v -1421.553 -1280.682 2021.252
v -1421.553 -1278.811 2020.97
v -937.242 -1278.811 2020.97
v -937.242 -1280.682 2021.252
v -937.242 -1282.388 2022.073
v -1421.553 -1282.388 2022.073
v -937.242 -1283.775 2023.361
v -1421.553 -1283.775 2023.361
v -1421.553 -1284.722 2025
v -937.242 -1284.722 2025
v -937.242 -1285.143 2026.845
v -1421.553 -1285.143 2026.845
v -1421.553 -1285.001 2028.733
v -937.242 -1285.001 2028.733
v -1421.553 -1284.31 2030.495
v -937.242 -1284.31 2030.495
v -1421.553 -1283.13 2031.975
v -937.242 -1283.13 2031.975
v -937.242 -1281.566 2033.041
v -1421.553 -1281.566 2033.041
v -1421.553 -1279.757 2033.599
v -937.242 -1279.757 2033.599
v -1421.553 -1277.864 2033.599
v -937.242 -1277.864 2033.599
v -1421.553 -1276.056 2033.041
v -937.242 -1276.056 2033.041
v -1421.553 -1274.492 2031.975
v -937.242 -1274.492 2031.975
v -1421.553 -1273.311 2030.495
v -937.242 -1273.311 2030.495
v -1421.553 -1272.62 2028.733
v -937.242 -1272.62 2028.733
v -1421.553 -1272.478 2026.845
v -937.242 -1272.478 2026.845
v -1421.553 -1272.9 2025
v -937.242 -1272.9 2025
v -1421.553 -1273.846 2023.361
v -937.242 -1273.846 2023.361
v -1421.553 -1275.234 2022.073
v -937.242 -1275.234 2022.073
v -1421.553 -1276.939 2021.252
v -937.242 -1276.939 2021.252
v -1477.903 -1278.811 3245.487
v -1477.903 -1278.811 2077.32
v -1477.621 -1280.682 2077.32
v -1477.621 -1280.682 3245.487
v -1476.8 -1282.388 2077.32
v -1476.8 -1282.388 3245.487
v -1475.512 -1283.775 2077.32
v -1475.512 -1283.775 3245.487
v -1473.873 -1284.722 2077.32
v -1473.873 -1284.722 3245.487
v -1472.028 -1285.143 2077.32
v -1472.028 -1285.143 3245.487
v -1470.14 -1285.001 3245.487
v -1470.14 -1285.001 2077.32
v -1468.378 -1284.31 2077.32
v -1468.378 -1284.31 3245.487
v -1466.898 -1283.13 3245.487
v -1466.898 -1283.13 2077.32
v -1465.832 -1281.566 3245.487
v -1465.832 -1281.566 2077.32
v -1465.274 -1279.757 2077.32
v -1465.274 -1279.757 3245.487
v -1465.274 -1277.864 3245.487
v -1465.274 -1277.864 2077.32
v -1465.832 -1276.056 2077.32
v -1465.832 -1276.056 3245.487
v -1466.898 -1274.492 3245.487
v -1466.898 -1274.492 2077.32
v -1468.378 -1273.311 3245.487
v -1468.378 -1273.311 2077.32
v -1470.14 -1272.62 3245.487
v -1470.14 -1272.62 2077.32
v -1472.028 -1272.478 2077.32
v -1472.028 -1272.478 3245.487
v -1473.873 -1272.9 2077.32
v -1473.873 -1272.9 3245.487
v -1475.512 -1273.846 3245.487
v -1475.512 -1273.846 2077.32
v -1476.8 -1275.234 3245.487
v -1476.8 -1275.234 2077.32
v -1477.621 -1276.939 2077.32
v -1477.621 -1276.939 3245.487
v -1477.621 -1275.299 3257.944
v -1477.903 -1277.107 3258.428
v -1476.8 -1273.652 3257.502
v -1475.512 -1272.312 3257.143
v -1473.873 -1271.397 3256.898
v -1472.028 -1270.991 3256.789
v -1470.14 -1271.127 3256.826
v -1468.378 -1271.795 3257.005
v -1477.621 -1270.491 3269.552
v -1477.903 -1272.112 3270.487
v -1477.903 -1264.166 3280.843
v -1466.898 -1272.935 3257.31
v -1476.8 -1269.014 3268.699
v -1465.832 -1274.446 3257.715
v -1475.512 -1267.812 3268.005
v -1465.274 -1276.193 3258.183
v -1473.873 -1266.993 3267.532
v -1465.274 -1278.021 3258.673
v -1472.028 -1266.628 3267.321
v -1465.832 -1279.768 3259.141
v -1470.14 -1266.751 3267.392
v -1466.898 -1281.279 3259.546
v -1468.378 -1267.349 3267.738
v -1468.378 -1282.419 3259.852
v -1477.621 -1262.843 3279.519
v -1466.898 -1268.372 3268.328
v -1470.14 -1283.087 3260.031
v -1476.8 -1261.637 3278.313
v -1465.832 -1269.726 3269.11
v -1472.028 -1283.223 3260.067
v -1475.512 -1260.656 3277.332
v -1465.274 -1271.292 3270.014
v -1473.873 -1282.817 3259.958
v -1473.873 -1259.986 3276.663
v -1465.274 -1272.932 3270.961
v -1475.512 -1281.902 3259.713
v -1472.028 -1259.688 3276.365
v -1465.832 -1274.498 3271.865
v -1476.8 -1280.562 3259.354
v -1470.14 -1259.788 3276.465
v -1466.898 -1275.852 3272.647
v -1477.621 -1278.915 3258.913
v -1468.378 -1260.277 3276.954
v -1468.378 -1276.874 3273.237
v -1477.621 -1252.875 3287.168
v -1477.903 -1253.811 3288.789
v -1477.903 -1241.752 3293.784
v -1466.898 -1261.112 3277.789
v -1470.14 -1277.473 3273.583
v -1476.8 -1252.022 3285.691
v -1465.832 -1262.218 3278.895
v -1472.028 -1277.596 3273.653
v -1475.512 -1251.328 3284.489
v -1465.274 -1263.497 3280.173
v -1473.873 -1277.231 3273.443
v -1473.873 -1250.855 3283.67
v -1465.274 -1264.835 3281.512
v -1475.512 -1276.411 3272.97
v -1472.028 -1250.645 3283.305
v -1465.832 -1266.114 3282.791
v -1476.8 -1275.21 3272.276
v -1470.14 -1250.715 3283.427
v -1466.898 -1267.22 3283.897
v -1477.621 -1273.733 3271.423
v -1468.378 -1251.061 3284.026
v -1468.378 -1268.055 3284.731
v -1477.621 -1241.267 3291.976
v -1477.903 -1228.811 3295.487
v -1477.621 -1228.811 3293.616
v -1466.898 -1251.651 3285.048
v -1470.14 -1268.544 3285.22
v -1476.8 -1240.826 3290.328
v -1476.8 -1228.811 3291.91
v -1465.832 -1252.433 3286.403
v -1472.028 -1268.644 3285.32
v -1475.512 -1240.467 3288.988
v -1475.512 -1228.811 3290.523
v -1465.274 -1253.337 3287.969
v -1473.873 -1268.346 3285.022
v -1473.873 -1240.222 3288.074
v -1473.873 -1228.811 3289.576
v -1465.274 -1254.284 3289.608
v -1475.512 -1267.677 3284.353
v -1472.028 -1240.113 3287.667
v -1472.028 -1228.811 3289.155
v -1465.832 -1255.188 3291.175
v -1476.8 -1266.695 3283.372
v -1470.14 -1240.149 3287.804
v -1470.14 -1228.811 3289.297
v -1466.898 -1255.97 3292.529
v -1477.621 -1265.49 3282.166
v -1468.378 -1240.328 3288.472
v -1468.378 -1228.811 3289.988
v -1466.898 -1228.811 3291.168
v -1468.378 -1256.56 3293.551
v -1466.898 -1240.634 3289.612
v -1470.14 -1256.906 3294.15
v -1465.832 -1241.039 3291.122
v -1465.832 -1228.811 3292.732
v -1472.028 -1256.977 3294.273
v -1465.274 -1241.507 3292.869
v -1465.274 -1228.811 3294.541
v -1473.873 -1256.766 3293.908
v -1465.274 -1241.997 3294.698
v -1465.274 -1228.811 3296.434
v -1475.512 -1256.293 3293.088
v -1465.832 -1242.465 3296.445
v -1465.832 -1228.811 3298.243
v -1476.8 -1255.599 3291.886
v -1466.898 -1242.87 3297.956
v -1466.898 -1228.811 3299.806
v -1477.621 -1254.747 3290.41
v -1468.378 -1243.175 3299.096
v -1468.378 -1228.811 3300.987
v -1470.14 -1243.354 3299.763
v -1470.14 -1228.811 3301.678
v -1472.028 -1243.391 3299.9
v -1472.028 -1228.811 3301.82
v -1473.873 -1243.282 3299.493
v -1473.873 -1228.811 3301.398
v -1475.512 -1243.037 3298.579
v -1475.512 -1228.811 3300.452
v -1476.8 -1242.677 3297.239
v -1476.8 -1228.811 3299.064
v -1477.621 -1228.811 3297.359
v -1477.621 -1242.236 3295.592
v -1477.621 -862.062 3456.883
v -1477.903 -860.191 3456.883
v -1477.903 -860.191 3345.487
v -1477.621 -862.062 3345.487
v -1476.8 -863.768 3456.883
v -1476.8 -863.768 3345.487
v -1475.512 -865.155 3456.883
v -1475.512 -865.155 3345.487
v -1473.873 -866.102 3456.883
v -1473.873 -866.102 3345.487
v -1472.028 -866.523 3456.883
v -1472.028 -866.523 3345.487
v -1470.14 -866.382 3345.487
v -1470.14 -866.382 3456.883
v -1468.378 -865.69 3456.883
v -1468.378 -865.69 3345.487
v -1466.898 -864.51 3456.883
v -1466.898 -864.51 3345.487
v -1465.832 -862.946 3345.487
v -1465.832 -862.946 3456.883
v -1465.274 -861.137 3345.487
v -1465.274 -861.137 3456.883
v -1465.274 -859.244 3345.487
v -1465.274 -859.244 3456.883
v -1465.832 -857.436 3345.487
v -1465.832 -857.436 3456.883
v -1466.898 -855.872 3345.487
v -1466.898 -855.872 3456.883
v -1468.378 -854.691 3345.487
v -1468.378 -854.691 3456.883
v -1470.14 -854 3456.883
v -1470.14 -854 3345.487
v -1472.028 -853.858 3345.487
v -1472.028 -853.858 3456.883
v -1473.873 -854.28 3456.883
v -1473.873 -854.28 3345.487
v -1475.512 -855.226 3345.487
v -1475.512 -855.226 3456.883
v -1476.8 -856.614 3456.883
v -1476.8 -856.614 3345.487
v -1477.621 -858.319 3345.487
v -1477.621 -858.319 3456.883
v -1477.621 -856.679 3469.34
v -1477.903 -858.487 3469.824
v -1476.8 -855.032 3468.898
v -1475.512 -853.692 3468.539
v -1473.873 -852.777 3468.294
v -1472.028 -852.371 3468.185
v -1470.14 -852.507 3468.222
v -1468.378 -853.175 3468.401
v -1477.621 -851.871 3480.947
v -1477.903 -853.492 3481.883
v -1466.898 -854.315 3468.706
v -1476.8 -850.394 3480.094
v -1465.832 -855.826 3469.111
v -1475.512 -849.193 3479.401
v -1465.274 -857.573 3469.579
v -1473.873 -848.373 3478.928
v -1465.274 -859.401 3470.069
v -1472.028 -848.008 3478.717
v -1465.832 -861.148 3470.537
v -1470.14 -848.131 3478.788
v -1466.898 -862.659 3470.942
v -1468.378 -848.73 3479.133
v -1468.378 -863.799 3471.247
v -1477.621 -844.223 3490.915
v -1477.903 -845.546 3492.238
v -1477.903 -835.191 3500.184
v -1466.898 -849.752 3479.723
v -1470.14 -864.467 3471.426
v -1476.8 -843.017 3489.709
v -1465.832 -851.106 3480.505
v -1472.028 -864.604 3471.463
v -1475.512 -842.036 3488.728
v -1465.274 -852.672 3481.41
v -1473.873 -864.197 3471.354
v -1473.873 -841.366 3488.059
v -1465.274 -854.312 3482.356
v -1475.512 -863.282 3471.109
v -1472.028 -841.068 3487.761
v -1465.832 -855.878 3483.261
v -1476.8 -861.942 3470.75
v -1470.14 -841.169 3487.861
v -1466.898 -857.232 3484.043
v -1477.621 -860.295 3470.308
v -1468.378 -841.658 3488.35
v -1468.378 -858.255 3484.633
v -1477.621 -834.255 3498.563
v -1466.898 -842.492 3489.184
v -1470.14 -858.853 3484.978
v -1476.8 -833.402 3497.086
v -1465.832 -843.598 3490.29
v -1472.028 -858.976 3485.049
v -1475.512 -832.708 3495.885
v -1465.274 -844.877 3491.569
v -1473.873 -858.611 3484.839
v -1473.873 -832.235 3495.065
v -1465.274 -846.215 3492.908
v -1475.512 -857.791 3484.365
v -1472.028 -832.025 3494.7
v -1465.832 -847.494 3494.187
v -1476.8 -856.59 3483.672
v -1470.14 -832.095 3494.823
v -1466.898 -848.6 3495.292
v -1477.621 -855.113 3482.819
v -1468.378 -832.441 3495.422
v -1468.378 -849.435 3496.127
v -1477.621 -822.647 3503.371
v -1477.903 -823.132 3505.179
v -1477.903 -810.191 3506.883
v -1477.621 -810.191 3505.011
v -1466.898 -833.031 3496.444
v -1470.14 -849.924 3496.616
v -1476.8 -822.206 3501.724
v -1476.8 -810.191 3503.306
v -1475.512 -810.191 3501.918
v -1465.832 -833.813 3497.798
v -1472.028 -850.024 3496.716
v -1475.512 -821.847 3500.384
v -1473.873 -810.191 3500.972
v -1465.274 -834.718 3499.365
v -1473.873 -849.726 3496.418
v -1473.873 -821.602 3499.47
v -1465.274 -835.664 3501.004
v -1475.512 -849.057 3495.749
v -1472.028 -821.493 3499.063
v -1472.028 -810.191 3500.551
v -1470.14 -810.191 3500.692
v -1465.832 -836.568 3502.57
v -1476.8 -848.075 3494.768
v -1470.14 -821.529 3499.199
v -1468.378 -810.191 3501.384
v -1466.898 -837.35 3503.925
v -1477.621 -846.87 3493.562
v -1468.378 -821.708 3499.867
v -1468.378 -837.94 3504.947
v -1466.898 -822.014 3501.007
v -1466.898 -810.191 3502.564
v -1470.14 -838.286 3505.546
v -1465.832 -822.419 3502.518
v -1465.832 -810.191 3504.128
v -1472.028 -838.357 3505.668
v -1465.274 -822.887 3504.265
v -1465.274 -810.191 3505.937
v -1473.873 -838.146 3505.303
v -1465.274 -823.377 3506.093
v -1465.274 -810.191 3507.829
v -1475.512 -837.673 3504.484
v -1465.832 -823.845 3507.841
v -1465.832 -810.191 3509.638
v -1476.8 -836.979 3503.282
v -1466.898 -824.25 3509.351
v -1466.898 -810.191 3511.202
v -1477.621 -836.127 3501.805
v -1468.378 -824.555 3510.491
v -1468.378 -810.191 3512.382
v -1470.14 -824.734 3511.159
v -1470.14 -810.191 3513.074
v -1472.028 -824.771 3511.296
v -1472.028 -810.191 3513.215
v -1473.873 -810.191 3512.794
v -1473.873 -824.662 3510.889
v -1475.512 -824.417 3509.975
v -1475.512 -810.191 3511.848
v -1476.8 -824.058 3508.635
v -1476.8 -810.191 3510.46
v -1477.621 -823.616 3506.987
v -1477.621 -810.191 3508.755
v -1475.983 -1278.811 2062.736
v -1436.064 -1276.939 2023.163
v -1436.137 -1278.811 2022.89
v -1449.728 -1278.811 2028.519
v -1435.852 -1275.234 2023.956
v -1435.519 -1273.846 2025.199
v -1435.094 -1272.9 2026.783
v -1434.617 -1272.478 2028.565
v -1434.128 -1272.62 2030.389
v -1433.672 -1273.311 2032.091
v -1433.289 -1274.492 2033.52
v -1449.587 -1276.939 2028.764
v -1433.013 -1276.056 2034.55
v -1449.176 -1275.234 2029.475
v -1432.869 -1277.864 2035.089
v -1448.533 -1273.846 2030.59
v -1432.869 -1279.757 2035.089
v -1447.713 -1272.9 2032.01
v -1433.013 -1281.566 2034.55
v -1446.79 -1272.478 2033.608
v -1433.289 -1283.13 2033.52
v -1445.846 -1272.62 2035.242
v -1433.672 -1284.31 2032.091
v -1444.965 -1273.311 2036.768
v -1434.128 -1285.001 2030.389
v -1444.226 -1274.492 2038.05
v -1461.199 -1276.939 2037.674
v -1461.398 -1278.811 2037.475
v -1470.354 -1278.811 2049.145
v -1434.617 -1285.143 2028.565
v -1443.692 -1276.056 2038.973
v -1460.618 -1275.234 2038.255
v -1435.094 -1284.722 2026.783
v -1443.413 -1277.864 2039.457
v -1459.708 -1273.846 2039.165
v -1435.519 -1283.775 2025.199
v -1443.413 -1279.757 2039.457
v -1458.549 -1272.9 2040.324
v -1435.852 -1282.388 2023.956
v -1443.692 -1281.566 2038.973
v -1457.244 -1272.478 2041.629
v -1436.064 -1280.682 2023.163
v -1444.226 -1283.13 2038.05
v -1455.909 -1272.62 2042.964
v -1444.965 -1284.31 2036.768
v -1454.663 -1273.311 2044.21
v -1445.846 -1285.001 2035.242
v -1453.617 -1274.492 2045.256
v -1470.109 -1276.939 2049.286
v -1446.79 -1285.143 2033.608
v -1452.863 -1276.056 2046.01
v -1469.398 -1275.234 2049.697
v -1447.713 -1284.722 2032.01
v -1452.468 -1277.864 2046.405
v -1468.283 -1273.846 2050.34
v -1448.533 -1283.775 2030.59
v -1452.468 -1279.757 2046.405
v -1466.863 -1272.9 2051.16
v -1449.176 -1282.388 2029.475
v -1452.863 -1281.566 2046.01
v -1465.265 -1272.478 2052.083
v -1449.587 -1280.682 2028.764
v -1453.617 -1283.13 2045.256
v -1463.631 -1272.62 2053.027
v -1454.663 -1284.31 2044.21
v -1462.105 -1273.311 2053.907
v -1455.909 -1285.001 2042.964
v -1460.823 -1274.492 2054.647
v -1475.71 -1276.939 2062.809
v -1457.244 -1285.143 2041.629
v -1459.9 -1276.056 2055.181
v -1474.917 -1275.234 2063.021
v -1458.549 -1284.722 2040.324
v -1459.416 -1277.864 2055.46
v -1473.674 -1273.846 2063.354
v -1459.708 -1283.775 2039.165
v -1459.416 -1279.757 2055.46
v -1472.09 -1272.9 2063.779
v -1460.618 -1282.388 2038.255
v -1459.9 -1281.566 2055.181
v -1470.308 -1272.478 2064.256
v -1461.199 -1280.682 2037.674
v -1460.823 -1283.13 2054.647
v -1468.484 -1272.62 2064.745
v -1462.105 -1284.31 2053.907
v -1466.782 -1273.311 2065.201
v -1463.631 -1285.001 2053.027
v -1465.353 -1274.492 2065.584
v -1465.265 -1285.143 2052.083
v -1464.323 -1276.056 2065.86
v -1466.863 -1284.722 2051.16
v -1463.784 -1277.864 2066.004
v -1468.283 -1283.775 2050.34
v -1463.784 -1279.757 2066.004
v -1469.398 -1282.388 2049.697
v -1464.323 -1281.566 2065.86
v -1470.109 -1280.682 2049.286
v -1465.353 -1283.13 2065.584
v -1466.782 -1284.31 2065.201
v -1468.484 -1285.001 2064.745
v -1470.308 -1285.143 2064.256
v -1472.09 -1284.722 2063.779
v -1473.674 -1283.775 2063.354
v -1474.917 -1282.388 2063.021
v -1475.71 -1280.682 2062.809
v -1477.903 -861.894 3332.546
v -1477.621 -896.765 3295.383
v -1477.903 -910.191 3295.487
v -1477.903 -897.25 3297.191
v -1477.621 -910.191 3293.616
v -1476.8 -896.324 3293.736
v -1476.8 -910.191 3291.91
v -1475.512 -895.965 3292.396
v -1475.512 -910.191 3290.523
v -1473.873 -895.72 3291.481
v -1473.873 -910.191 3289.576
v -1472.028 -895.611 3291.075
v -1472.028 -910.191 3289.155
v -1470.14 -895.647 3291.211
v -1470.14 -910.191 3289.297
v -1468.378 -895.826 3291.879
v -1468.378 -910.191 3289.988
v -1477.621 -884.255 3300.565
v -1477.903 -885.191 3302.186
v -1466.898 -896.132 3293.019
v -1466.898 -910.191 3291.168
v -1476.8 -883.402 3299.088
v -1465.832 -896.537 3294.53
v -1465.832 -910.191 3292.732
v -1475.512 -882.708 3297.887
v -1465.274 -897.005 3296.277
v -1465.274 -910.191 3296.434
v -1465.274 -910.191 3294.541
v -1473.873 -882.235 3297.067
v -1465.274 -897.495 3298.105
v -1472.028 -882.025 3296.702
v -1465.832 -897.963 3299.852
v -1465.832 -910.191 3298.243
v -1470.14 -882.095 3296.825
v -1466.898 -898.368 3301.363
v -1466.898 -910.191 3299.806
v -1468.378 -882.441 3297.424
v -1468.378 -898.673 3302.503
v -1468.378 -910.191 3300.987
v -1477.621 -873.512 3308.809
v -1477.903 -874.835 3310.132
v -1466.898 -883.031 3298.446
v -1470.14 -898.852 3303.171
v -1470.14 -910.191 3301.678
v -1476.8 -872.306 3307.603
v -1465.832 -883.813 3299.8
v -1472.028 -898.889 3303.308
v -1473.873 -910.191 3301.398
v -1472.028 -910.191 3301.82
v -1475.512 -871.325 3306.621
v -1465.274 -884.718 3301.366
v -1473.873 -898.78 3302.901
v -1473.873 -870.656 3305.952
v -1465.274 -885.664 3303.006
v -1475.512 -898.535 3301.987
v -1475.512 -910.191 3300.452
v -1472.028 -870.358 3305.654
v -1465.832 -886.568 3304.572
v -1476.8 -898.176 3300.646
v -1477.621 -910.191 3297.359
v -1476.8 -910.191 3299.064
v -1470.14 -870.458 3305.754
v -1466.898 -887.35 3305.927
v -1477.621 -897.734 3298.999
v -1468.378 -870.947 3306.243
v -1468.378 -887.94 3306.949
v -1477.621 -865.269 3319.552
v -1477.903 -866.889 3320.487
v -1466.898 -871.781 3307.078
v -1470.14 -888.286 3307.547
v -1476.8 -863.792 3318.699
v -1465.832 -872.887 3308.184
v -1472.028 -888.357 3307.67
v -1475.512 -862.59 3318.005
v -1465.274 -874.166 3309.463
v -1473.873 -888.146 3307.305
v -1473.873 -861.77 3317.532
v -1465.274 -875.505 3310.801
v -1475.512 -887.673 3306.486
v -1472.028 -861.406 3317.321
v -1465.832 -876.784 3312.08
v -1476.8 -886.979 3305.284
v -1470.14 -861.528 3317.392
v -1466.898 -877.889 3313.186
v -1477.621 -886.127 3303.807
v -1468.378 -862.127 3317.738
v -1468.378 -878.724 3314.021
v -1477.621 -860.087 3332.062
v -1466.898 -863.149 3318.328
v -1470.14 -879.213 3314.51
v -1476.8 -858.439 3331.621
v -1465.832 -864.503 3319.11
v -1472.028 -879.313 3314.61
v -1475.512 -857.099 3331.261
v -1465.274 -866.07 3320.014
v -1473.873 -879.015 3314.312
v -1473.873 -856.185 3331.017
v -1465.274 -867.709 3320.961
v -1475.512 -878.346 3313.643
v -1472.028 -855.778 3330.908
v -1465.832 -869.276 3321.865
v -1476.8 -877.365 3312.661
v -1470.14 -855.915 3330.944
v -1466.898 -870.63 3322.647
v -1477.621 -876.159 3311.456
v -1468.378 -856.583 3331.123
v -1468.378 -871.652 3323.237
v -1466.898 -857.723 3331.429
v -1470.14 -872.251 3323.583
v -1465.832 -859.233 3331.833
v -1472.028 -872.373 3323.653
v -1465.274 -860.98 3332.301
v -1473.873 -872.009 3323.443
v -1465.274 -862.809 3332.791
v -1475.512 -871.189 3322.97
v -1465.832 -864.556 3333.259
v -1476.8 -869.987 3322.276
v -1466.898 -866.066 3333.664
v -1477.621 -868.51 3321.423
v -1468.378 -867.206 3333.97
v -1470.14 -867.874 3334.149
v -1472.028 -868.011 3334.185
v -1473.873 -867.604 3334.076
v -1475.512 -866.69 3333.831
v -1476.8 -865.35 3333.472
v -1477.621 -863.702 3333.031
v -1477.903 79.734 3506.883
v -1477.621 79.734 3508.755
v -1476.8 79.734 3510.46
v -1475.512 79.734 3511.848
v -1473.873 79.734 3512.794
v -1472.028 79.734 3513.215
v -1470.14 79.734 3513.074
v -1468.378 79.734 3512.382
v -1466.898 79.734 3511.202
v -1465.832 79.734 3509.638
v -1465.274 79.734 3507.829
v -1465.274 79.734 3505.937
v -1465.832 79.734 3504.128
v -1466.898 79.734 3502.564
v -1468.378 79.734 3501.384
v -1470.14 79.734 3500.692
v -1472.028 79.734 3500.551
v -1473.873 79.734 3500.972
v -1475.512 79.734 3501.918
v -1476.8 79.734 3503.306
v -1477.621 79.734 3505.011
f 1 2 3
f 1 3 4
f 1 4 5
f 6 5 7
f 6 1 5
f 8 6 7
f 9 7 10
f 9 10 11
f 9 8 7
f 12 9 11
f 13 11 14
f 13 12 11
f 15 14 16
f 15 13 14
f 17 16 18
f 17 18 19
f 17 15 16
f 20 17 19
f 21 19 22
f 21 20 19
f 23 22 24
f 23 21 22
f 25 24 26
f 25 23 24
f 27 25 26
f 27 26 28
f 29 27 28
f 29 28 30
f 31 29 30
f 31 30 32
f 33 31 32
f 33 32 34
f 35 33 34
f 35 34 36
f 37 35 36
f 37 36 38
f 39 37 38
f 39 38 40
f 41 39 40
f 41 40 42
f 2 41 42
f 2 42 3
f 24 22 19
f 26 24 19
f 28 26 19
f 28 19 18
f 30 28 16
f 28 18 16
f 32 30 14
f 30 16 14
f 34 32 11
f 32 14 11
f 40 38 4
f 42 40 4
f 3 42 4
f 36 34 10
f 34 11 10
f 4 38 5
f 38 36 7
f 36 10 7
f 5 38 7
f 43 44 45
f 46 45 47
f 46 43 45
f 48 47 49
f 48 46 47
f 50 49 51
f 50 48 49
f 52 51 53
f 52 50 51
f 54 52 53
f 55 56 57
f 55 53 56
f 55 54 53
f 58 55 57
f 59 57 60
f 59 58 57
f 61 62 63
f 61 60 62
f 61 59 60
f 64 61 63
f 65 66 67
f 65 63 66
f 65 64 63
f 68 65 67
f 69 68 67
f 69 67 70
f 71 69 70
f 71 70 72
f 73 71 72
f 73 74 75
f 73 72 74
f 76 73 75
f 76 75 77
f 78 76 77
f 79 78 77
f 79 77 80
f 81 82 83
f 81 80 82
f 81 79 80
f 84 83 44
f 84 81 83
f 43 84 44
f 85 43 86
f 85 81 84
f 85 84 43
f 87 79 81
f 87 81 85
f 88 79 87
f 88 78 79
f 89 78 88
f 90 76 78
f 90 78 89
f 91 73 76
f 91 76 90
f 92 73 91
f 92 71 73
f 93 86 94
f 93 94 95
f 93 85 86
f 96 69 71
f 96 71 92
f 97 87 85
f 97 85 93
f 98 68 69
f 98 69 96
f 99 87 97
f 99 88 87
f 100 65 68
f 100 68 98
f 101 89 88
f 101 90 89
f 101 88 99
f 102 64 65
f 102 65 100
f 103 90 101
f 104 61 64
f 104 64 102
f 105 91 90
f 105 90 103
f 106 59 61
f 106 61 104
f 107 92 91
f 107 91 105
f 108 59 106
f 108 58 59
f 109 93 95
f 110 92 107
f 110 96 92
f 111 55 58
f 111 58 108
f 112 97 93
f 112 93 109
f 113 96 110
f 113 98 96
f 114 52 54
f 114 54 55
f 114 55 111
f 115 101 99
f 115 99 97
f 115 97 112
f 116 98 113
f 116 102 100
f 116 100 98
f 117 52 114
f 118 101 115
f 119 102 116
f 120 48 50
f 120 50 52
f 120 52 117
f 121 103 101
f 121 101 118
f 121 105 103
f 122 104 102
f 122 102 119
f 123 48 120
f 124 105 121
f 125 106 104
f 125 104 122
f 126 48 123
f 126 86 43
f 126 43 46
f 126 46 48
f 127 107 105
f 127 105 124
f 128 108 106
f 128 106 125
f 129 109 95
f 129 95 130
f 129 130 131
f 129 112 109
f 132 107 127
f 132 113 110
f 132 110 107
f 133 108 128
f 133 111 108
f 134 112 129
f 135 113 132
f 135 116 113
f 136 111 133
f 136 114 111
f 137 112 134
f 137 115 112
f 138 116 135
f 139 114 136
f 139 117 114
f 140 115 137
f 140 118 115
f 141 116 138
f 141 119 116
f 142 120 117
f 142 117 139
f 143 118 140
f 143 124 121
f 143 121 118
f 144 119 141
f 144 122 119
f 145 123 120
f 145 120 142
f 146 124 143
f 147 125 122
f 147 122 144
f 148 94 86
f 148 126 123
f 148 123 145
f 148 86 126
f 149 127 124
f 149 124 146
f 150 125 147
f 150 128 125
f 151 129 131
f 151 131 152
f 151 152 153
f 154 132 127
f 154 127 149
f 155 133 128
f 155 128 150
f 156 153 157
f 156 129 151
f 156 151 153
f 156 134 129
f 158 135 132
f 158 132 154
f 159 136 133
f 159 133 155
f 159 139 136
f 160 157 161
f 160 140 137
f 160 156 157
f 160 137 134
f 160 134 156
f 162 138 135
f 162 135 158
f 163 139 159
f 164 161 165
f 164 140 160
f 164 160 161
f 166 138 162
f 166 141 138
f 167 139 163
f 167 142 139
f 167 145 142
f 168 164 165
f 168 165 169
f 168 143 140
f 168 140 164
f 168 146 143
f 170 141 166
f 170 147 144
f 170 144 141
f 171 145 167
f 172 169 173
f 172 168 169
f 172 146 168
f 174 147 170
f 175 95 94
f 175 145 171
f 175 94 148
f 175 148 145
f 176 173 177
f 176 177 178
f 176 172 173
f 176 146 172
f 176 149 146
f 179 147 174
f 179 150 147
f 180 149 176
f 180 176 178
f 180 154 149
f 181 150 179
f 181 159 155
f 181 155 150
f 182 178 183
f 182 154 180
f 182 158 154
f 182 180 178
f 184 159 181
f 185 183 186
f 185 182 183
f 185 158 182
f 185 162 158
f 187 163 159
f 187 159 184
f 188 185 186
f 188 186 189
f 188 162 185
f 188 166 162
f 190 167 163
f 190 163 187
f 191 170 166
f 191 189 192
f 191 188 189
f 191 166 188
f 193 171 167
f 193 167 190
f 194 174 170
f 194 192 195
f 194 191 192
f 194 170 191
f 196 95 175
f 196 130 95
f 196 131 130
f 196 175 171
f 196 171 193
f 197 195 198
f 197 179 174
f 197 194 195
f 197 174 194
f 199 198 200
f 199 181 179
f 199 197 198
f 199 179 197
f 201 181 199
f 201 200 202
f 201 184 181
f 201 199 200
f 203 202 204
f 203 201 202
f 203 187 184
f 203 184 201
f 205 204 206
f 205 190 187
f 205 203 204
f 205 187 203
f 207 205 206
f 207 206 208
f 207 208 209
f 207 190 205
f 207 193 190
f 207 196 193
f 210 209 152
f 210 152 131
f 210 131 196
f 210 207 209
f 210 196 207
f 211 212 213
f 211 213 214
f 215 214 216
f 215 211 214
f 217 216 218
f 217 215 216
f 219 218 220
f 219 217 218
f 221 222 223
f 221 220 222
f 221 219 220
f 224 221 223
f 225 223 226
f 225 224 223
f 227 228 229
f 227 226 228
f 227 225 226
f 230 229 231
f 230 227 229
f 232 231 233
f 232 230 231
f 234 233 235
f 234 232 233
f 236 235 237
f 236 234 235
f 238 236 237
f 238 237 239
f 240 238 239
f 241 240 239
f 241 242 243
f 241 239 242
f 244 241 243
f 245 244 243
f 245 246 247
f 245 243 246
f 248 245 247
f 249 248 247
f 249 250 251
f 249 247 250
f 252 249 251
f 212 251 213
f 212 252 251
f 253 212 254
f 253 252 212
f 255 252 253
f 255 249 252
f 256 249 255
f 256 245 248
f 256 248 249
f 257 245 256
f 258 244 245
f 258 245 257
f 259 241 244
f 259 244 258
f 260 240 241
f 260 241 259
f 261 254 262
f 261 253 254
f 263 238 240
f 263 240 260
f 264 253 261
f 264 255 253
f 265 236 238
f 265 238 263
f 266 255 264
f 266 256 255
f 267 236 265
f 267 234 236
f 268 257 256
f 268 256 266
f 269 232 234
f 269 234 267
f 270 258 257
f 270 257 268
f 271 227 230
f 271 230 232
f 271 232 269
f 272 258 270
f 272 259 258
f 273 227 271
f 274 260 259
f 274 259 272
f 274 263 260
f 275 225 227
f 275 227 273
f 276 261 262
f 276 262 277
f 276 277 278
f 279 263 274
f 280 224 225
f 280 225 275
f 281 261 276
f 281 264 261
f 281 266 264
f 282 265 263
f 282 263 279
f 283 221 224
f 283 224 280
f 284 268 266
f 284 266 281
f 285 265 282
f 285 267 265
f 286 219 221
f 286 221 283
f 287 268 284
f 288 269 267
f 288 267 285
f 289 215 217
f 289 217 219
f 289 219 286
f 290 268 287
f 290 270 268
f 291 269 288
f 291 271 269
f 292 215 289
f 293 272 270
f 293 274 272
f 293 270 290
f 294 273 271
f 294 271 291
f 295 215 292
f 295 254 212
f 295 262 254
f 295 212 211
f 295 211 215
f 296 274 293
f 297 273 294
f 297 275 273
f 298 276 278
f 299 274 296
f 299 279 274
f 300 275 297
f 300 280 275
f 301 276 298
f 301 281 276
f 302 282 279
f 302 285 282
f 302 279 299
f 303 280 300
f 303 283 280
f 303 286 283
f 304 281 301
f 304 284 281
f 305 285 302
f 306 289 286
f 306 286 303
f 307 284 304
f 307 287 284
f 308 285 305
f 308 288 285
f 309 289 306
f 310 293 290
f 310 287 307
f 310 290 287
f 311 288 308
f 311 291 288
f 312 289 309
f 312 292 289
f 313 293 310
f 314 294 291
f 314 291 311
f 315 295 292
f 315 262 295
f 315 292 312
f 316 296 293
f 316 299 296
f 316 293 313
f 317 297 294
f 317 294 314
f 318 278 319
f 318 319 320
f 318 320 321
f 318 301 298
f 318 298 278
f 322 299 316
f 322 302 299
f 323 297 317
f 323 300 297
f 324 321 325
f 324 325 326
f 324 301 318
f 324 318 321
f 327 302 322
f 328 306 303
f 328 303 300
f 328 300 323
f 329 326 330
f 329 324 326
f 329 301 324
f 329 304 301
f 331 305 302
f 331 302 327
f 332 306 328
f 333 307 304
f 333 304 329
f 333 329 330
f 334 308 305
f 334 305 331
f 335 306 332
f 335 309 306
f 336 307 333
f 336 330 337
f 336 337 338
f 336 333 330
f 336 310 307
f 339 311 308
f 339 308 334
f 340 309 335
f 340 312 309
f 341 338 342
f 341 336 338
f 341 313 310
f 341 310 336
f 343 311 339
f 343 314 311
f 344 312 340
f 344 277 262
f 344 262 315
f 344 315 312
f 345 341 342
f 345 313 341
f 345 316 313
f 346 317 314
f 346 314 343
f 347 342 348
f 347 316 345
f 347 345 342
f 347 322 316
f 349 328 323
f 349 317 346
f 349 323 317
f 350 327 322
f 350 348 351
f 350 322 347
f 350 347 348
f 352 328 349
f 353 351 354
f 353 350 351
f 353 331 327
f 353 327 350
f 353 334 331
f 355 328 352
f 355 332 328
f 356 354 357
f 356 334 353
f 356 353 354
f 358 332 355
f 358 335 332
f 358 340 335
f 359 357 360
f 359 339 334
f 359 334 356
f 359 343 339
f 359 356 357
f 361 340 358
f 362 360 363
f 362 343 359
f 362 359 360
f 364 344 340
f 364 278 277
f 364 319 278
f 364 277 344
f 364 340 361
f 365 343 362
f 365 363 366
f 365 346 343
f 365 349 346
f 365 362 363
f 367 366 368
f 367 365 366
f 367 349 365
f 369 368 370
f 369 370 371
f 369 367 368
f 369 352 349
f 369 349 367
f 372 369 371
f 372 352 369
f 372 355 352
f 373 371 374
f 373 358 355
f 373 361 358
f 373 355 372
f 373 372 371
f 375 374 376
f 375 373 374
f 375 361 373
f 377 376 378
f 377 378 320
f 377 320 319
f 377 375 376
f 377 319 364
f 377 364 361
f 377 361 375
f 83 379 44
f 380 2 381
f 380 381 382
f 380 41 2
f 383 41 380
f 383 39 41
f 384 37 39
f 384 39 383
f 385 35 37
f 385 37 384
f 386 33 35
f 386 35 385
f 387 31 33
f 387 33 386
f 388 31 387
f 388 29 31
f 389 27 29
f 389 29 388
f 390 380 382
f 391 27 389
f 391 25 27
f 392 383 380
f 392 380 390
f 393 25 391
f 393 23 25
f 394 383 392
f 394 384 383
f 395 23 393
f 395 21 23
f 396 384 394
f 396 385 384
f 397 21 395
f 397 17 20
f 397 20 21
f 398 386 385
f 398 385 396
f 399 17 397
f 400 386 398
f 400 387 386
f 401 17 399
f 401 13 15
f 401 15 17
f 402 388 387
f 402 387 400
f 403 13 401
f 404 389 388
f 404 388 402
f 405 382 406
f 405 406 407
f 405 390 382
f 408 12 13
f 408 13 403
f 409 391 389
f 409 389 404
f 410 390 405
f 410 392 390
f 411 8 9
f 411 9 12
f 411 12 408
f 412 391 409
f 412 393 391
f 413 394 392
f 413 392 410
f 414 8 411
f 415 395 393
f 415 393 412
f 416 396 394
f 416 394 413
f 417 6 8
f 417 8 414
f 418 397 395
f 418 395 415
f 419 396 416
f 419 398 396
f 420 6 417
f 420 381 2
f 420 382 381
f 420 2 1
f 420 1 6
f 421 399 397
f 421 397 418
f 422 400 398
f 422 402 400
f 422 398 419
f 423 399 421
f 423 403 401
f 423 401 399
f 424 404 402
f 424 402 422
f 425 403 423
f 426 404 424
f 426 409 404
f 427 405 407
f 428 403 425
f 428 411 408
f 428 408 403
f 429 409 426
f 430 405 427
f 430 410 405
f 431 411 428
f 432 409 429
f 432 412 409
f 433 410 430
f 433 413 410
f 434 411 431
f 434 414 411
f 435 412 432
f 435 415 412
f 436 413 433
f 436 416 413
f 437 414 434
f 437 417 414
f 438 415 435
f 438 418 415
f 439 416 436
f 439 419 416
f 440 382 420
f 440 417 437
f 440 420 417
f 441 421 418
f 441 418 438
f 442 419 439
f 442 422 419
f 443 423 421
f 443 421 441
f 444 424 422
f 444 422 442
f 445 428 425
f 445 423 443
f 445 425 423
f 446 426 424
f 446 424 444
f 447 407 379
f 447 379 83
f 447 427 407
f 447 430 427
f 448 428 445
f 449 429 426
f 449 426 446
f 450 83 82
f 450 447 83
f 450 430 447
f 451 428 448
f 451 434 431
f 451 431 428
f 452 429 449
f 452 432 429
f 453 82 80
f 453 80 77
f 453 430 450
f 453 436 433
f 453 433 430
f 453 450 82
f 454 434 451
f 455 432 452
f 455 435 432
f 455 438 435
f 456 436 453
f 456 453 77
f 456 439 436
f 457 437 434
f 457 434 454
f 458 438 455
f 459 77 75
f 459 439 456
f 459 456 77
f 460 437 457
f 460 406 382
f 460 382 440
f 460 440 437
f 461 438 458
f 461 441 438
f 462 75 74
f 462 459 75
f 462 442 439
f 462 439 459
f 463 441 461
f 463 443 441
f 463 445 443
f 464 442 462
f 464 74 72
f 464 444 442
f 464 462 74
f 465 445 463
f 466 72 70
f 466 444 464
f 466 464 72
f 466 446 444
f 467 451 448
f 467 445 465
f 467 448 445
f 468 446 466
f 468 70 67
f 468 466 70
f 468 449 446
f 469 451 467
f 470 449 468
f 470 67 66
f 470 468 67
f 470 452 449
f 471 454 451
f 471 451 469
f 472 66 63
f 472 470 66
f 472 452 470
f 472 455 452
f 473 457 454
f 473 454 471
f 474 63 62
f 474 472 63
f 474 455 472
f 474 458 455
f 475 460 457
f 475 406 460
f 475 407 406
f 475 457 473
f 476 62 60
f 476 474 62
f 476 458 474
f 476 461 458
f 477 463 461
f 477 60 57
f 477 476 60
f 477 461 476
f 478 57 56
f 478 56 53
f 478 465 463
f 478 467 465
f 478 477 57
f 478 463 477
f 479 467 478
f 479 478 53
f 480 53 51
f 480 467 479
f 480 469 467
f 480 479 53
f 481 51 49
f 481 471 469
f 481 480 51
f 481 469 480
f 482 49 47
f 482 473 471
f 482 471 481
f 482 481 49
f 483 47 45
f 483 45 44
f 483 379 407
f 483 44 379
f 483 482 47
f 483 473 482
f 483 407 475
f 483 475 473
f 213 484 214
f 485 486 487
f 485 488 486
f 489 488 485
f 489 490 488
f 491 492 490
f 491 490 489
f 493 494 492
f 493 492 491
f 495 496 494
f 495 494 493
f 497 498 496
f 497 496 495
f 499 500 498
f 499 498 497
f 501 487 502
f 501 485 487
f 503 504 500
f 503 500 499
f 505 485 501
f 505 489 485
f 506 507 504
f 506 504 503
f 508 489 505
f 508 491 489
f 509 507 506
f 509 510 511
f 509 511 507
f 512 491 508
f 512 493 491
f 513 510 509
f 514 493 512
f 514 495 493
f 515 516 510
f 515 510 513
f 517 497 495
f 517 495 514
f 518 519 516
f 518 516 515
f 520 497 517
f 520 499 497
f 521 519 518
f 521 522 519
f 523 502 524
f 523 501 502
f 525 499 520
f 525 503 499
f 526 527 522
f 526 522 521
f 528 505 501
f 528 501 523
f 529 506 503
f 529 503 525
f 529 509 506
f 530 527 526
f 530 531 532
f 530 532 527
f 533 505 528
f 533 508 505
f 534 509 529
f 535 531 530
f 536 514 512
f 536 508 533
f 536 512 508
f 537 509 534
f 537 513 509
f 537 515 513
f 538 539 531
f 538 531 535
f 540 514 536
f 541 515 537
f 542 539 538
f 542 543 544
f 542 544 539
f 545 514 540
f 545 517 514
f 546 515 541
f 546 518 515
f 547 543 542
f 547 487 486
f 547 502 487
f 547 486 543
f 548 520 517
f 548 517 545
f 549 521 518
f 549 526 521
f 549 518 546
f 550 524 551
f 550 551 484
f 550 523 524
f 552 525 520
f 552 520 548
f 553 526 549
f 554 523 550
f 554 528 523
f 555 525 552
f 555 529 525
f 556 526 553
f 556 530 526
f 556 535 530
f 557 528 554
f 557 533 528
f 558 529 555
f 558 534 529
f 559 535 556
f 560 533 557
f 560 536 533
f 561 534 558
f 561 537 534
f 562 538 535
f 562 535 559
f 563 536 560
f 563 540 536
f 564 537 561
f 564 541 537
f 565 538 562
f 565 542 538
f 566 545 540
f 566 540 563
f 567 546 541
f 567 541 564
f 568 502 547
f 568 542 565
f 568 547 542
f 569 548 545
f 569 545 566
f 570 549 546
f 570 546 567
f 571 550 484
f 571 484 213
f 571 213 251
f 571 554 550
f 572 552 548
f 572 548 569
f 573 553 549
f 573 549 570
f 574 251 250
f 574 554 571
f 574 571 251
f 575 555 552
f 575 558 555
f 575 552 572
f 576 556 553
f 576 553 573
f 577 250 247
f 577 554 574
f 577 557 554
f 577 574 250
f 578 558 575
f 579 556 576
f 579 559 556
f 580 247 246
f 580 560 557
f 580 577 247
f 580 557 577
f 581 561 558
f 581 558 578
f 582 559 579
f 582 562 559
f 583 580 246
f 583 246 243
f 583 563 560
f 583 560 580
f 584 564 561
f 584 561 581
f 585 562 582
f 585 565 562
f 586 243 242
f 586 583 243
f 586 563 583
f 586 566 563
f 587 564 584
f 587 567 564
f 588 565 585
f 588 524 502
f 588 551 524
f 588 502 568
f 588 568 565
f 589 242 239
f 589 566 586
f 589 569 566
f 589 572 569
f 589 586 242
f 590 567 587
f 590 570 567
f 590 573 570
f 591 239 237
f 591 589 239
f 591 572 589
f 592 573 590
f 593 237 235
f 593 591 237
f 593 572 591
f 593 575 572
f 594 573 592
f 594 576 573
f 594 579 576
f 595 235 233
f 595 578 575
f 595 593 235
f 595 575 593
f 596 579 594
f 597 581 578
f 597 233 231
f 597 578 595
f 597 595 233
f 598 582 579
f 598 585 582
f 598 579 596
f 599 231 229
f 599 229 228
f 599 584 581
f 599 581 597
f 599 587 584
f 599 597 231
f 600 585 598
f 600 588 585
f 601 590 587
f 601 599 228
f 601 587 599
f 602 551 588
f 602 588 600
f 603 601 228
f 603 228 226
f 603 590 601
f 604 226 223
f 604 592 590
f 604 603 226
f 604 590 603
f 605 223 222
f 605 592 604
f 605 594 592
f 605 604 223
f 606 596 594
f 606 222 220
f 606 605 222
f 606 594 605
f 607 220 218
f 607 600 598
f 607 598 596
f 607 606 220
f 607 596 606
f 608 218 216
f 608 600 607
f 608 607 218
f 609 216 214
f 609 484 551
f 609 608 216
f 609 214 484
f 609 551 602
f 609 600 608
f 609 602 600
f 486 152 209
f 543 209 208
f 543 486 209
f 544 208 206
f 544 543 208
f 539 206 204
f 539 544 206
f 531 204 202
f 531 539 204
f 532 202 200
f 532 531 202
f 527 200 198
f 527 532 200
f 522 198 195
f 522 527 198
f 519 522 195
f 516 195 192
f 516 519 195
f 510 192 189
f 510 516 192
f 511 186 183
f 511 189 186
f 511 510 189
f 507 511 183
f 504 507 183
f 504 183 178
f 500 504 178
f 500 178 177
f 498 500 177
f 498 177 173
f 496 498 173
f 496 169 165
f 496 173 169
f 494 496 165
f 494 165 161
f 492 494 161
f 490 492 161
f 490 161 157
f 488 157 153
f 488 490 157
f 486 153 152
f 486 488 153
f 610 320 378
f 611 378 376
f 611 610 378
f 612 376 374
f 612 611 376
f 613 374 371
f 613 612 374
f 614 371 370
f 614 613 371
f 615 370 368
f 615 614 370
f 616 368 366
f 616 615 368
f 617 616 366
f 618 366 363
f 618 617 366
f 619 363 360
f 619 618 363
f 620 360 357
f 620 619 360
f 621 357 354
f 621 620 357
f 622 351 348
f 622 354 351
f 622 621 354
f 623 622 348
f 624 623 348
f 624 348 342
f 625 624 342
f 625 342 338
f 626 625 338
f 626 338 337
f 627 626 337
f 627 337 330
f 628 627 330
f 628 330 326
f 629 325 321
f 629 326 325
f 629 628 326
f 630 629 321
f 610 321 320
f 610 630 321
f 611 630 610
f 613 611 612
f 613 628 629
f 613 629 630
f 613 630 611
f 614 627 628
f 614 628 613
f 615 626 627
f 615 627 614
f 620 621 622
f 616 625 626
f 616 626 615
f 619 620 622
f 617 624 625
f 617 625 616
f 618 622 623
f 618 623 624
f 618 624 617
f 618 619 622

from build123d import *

# Parameters (mm, degrees)
BARRER1_PROFILE_R = 6.35


with BuildPart() as part:
    # Barrer1: sweep along a curve in space
    with BuildLine() as barrer1_path:
        Line((-937.241981619, -1278.810695772, 2027.32), (-1421.552983389, -1278.810695772, 2027.32))
        ThreePointArc((-1421.552983389, -1278.810695772, 2027.32), (-1456.908322449, -1278.810695772, 2041.964660941), (-1471.552983389, -1278.810695772, 2077.32))
        Line((-1471.552983389, -1278.810695772, 2077.32), (-1471.552983389, -1278.810695772, 3245.487357808))
        ThreePointArc((-1471.552983389, -1278.810695772, 3245.487357808), (-1471.552983389, -1264.166034831, 3280.842696867), (-1471.552983389, -1228.810695772, 3295.487357808))
        Line((-1471.552983389, -1228.810695772, 3295.487357808), (-1471.552983389, -910.190731412, 3295.487357808))
        ThreePointArc((-1471.552983389, -910.190731412, 3295.487357808), (-1471.552983389, -874.835392353, 3310.132018749), (-1471.552983389, -860.190731412, 3345.487357808))
        Line((-1471.552983389, -860.190731412, 3345.487357808), (-1471.552983389, -860.190731412, 3456.883033298))
        ThreePointArc((-1471.552983389, -860.190731412, 3456.883033298), (-1471.552983389, -845.546070472, 3492.238372357), (-1471.552983389, -810.190731412, 3506.883033298))
        Line((-1471.552983389, -810.190731412, 3506.883033298), (-1471.552983389, 79.733825002, 3506.883033298))
    # Barrer1 profile (on start of the path) → Barrer1 (sweep)
    with BuildSketch(Plane(origin=(-937.241981619, -1278.810695772, 2027.32), x_dir=(0, 0, -1), z_dir=(-1, 0, 0))):
        Circle(BARRER1_PROFILE_R)
    sweep(path=barrer1_path.line)


solid = part.part
